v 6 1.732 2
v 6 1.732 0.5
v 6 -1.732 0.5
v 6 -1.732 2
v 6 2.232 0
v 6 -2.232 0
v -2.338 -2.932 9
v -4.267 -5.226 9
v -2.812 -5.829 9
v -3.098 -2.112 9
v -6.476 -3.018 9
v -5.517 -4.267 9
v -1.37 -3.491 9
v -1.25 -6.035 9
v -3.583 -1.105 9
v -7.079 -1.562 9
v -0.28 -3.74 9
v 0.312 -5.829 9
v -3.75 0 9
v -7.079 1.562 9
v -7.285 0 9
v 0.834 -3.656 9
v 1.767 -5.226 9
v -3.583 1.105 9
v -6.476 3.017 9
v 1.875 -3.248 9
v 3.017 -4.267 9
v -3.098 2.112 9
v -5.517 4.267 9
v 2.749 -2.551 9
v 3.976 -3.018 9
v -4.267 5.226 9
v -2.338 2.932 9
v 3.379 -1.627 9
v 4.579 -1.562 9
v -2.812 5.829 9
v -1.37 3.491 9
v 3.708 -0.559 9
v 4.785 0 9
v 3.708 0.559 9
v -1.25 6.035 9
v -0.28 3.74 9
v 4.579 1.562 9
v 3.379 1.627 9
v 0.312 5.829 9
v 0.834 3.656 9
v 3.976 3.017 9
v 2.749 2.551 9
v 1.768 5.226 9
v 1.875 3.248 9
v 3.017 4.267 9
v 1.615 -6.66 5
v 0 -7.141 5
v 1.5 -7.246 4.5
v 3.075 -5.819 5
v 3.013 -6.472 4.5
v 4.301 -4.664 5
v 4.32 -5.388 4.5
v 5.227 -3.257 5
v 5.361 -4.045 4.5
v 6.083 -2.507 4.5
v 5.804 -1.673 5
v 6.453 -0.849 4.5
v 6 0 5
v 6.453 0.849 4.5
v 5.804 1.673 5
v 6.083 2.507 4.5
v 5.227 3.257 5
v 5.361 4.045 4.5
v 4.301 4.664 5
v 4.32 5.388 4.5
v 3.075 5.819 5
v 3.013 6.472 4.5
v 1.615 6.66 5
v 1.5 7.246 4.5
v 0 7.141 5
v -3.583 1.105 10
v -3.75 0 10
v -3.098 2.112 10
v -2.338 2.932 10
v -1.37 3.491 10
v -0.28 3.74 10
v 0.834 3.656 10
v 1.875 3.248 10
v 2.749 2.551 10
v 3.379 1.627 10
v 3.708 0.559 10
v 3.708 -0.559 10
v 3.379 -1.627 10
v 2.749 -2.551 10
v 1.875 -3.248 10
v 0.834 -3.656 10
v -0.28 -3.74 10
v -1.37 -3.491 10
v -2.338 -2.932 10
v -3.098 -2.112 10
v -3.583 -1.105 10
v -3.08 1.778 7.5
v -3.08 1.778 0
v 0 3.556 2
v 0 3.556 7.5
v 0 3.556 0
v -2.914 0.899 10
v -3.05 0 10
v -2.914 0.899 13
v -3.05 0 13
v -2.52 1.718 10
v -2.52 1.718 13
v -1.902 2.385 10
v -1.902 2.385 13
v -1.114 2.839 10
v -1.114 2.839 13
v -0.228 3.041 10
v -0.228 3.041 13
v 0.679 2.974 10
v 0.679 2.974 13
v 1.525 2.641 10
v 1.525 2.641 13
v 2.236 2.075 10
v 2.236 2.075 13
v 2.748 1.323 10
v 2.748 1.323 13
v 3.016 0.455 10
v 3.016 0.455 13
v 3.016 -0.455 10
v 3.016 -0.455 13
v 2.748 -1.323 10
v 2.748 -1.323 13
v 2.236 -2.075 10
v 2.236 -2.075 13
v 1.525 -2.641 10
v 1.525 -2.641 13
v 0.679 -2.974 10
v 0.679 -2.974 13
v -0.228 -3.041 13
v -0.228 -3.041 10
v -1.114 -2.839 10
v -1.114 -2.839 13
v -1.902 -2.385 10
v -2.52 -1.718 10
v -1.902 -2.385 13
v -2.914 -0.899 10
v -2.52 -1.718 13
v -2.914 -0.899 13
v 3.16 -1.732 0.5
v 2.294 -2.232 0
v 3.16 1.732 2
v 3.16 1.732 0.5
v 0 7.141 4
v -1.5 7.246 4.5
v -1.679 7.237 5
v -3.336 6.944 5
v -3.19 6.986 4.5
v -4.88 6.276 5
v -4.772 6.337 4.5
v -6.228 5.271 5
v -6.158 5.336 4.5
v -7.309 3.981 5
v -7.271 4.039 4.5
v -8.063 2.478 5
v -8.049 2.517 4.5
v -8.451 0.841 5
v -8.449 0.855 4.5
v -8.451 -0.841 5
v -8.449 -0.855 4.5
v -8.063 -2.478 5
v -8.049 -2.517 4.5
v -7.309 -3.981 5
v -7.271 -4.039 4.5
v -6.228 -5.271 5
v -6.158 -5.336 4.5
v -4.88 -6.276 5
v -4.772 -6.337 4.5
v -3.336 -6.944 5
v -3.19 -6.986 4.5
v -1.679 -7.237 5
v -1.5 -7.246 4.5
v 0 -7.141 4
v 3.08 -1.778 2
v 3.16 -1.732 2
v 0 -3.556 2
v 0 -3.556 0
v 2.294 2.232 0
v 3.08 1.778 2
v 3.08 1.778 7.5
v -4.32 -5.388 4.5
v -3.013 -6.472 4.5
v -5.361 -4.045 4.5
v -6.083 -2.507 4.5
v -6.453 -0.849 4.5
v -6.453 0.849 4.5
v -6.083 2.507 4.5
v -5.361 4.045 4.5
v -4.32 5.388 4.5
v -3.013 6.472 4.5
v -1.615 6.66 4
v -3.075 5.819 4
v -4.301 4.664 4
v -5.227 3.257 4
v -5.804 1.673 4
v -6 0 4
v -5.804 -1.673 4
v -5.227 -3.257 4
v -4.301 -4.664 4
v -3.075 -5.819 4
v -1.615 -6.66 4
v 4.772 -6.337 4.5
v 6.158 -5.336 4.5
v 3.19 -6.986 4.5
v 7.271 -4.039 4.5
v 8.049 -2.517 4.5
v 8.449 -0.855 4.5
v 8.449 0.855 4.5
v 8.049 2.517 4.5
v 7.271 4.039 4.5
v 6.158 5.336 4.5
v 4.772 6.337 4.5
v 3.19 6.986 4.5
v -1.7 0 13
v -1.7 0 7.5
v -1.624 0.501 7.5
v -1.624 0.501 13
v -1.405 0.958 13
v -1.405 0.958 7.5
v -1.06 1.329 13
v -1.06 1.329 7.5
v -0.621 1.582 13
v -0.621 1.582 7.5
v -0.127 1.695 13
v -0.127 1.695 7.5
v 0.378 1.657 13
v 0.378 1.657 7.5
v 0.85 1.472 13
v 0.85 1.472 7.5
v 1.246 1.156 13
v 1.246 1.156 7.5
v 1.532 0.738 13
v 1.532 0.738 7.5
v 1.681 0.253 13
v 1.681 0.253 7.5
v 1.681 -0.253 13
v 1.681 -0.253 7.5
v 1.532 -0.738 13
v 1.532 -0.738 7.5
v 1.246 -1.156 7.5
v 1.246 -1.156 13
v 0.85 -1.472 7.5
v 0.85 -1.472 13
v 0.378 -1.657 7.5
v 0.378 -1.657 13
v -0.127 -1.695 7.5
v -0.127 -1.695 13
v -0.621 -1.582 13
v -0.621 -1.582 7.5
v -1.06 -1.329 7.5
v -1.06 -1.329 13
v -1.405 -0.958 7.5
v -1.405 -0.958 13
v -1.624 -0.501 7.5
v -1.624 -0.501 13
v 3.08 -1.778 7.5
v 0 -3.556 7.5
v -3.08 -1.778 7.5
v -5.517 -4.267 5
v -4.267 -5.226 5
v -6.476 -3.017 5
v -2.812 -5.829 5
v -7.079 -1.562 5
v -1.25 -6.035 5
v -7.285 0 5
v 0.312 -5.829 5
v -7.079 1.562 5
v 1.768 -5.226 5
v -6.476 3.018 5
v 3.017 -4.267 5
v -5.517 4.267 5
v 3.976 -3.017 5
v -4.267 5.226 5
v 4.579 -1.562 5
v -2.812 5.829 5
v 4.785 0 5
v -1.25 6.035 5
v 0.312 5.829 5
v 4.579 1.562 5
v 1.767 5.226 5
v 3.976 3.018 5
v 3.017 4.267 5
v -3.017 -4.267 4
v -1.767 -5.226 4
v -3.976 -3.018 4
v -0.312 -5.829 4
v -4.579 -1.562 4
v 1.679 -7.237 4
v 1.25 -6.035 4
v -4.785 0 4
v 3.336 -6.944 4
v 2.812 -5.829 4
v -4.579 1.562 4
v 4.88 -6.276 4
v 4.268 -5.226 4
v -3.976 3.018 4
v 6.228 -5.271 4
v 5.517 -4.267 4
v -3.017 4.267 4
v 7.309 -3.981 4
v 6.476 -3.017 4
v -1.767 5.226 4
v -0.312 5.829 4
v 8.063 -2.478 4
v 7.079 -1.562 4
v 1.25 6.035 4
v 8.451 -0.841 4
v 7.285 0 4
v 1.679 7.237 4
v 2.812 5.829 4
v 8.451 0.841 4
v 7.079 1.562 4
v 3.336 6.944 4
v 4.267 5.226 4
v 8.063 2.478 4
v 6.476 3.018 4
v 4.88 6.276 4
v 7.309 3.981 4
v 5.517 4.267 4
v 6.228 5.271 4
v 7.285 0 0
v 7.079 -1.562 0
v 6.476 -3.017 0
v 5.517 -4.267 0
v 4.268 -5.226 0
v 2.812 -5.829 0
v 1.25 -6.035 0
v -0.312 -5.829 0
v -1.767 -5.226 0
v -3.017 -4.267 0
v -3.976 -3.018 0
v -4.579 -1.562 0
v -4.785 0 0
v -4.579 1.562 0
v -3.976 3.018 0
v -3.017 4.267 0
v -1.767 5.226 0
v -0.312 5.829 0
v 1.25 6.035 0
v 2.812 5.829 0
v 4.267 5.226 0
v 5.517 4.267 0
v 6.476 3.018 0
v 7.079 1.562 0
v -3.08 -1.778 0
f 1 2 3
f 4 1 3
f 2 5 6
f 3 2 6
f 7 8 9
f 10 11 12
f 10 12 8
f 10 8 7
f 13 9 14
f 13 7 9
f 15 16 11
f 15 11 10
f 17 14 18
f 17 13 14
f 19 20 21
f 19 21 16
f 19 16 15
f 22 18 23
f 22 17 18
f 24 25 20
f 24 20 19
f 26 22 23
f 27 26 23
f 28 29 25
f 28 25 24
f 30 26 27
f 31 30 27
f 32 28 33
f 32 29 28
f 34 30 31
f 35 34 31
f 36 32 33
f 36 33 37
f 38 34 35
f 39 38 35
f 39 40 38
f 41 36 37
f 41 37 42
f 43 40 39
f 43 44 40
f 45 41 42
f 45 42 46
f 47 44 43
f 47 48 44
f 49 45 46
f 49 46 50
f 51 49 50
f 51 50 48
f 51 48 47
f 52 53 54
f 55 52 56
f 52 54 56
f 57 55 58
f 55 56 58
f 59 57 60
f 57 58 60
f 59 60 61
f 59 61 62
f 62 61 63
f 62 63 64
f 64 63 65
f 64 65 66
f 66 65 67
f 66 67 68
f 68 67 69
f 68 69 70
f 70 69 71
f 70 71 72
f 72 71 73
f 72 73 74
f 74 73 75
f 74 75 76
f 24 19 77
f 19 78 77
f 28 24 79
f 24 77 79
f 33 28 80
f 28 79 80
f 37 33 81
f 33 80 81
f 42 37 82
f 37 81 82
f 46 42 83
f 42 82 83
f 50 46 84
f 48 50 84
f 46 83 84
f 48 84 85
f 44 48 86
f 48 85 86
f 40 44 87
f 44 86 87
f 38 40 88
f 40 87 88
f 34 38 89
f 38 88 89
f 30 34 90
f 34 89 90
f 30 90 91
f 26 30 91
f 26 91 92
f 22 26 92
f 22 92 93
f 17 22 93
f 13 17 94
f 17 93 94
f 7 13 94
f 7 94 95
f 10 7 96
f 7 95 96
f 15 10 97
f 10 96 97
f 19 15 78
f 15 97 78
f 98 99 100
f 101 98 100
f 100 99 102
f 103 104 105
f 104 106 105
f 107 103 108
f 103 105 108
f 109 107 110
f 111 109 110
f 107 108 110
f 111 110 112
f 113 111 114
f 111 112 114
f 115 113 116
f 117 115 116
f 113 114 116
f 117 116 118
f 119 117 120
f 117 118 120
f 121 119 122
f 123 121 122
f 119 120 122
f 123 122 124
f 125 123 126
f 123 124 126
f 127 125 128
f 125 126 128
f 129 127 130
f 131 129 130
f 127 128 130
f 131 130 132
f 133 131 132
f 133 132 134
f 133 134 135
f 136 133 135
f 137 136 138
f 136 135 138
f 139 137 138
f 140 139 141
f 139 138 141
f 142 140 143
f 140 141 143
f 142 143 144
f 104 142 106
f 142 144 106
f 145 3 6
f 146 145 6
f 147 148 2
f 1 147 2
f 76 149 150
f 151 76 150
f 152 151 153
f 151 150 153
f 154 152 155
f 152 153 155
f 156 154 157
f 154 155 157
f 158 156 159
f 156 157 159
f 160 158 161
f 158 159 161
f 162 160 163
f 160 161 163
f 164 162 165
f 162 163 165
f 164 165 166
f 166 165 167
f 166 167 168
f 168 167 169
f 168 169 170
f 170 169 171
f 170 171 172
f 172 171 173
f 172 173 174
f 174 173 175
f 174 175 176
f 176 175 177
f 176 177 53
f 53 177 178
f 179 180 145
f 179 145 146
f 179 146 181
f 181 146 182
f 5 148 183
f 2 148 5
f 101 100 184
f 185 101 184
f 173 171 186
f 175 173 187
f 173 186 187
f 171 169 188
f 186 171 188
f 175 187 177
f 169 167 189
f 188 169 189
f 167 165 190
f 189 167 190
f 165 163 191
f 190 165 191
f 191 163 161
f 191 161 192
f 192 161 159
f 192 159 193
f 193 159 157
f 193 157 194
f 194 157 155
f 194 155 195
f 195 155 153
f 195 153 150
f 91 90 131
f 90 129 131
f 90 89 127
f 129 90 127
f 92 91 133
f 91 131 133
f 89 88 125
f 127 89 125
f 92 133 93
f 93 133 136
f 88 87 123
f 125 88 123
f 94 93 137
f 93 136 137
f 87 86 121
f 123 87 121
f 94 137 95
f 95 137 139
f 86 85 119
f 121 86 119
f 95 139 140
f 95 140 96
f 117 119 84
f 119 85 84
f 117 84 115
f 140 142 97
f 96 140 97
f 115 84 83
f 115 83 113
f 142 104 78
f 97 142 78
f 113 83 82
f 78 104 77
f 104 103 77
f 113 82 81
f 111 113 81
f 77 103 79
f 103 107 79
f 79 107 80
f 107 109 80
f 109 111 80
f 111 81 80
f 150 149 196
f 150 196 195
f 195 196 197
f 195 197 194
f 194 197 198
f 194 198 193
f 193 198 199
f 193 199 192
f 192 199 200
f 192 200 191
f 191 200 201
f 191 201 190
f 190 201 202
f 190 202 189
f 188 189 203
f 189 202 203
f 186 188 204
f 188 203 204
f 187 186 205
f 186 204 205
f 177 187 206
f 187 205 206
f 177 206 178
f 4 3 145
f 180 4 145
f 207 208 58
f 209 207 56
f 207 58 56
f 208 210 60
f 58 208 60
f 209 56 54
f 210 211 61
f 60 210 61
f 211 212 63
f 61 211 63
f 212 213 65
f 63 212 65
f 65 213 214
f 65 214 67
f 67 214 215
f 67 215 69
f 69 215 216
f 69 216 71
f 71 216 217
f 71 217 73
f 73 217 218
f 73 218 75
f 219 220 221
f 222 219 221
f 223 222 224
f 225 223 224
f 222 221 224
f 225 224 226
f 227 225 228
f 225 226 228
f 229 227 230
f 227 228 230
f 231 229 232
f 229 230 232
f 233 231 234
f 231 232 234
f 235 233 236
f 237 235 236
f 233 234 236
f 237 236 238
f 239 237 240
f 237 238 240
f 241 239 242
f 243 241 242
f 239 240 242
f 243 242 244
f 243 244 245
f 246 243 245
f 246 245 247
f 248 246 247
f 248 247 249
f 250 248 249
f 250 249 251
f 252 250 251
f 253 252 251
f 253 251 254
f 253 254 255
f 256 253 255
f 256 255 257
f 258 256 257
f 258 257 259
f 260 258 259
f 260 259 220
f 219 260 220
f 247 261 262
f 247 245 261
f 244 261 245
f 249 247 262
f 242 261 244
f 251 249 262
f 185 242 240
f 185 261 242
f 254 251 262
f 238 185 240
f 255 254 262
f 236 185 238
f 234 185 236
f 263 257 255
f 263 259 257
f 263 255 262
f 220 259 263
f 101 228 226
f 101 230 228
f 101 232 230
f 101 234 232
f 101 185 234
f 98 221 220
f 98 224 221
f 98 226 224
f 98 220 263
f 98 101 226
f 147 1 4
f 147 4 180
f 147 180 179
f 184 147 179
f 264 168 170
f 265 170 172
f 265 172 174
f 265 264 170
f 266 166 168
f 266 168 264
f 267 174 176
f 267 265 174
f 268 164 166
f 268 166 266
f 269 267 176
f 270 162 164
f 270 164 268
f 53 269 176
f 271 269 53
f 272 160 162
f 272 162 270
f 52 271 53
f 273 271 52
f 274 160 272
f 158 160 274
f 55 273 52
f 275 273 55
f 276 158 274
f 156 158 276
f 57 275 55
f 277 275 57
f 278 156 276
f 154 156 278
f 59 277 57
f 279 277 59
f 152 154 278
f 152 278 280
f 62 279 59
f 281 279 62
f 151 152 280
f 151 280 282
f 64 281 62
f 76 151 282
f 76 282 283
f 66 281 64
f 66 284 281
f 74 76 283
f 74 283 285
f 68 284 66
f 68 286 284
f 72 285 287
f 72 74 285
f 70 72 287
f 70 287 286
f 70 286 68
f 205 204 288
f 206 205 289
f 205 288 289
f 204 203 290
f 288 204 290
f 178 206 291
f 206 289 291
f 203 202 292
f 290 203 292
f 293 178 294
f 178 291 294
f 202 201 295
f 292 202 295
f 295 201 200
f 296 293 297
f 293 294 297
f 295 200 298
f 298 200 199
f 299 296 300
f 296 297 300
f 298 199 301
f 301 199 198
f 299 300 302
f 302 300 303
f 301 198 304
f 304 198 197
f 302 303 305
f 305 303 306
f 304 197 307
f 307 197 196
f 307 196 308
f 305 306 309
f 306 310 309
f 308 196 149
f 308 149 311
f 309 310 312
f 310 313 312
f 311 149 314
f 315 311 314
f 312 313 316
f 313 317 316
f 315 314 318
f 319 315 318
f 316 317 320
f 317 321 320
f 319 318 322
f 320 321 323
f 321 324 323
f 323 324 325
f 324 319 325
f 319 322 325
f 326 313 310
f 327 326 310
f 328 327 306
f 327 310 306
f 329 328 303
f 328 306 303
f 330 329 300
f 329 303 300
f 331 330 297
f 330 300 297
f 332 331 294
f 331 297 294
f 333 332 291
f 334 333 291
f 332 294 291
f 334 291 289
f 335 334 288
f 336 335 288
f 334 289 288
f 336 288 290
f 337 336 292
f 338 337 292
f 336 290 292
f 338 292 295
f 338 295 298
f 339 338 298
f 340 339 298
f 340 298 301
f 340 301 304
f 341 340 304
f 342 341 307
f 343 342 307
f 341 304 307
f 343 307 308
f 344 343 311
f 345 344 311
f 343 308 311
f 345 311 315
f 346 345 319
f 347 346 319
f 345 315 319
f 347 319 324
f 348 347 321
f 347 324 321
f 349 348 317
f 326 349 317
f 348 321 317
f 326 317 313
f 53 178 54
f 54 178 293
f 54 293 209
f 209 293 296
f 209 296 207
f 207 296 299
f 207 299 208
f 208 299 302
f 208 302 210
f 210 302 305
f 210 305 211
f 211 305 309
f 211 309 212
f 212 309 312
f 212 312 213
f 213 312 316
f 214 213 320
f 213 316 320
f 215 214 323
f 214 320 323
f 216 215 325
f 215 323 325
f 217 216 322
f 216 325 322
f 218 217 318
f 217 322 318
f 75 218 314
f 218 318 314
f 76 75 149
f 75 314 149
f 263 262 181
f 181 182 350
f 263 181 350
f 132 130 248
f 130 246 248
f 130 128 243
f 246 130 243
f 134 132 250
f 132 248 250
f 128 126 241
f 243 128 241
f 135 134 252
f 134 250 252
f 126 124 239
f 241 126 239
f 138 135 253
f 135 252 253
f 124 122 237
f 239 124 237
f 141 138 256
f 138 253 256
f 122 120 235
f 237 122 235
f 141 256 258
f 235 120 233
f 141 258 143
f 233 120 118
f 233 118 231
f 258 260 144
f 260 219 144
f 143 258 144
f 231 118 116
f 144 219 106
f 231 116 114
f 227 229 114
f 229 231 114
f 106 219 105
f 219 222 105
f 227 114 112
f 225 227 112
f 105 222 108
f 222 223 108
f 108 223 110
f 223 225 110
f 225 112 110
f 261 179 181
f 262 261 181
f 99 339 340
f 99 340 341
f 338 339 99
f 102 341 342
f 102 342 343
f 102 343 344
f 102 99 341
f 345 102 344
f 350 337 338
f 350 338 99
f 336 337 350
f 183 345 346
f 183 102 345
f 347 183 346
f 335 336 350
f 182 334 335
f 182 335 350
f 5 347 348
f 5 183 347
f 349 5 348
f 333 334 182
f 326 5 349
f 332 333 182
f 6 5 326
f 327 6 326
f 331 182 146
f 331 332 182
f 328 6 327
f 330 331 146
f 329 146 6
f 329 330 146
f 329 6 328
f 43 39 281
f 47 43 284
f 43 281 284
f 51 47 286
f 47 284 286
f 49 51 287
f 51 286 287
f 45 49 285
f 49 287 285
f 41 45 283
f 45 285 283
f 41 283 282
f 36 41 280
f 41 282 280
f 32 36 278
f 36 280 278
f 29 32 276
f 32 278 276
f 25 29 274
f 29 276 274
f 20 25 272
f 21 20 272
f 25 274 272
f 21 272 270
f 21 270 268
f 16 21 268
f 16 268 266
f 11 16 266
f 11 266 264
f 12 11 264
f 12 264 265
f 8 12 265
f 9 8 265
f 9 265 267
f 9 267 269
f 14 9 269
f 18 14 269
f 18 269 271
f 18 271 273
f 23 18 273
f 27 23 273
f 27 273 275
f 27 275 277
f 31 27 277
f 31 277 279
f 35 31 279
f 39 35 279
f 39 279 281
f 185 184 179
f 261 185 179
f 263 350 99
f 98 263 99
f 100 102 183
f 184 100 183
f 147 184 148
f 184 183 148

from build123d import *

# Parameters (mm, degrees)
EXTRUDE_START               = -0.5
EXTRUDE_1_OUTLINE_R         = 6.035
EXTRUDE_1_DEPTH             = 4.5
EXTRUDE_START_2             = 4
EXTRUDE_1_2_DEPTH           = 1
SKETCH_2_R                  = 6.035
EXTRUDE_2_DEPTH             = 4
CUT_EXTRUDE_1_DEPTH         = 2
CUT_EXTRUDE_2_DEPTH         = 5.5
HOLE_WIZARD_3_4_3_4_1_D     = 3.4
HOLE_WIZARD_3_4_3_4_1_DEPTH = 13
CHAMFER_1_SIZE              = 0.5


with BuildPart() as part:
    # 凸台-拉伸1: read off the stored shape, not the designer's step
    # 凸台-拉伸1 outline → 凸台-拉伸1 (new body)
    with BuildSketch(Plane.XY.offset(5).offset(EXTRUDE_START)):
        with Locations((-1.25, 0)):
            Circle(EXTRUDE_1_OUTLINE_R)
    extrude(amount=EXTRUDE_1_DEPTH)

    # Extrude 1 2 outline → Extrude 1 2 (add)
    with BuildSketch(Plane.XY.offset(EXTRUDE_START_2)):
        with BuildLine():
            ThreePointArc((0, -7.141428429), (8.5, 0), (0, 7.141428429))
            ThreePointArc((0, 7.141428429), (-8.5, 0), (0, -7.141428429))
        make_face()
    extrude(amount=EXTRUDE_1_2_DEPTH)

    # Extrude 1 3 outline → Extrude 1 3 (revolve, cut)
    with BuildSketch(Plane(origin=(-1.25, 0, 0), x_dir=(1, 0, 0), z_dir=(0, -1, 0))):
        Polygon((7.25, 5), (7.75, 4.5), (9.75, 4.5), (9.75, 5), align=None)
    revolve(axis=Axis((-1.25, 0, 0), (0, 0, 1)), mode=Mode.SUBTRACT)

    # Extrude 1 4 outline → Extrude 1 4 (revolve, cut)
    with BuildSketch(Plane(origin=(1.25, 0, 0), x_dir=(1, 0, 0), z_dir=(0, -1, 0))):
        Polygon((9.75, 4.5), (7.75, 4.5), (7.25, 4), (9.75, 4), align=None)
    revolve(axis=Axis((1.25, 0, 0), (0, 0, 1)), mode=Mode.SUBTRACT)

    # 草图2 → 凸台-拉伸2 (add)
    with BuildSketch(Plane(origin=(0, 0, 4), x_dir=(-1, 0, 0), z_dir=(0, 0, -1))):
        with Locations(Location((-1.25, 0, 0), (0, 0, 180))):
            Circle(SKETCH_2_R)
    extrude(amount=EXTRUDE_2_DEPTH)

    # 草图3 → 切除-拉伸1 (cut)
    with BuildSketch(Plane(origin=(0, 0, 0), x_dir=(-1, 0, 0), z_dir=(0, 0, -1))):
        Polygon((-6, -1.732050808), (-3.16, -1.732050808), (0, -3.556477658), (3.08, -1.778238829), (3.08, 1.778238829), (0, 3.556477658), (-3.16, 1.732050808), (-6, 1.732050808), align=None)
    extrude(amount=-CUT_EXTRUDE_1_DEPTH, mode=Mode.SUBTRACT)

    # 草图4 → 切除-拉伸2 (cut)
    with BuildSketch(Plane(origin=(0, 0, 2), x_dir=(-1, 0, 0), z_dir=(0, 0, -1))):
        Polygon((-3.08, -1.778238829), (0, -3.556477658), (3.08, -1.778238829), (3.08, 1.778238829), (0, 3.556477658), (-3.08, 1.778238829), align=None)
    extrude(amount=-CUT_EXTRUDE_2_DEPTH, mode=Mode.SUBTRACT)

    # 草图5 → 旋转1 (revolve)
    with BuildSketch(Plane.XZ, mode=Mode.PRIVATE) as revolve_1_sk:
        Polygon((3.05, 13), (0, 13), (0, 9), (3.75, 9), (3.75, 10), (3.05, 10), align=None)
    revolve(revolve_1_sk.sketch.rotate(Axis((0, 0, 13), (0, 0, -1)), 180), axis=Axis((0, 0, 13), (0, 0, -1)))

    # Ø3.4 (3.4) 直径孔1
    with Locations(Plane.XY.offset(13)):
        with Locations((0, 0)):
            Hole(HOLE_WIZARD_3_4_3_4_1_D / 2, depth=HOLE_WIZARD_3_4_3_4_1_DEPTH)

    # 倒角1
    chamfer_1_edges = [part.edges().sort_by_distance(p)[0] for p in [
        (4.58, -1.732050808, 0),
        (4.58, 1.732050808, 0),
    ]]
    chamfer(chamfer_1_edges, length=CHAMFER_1_SIZE)


solid = part.part
